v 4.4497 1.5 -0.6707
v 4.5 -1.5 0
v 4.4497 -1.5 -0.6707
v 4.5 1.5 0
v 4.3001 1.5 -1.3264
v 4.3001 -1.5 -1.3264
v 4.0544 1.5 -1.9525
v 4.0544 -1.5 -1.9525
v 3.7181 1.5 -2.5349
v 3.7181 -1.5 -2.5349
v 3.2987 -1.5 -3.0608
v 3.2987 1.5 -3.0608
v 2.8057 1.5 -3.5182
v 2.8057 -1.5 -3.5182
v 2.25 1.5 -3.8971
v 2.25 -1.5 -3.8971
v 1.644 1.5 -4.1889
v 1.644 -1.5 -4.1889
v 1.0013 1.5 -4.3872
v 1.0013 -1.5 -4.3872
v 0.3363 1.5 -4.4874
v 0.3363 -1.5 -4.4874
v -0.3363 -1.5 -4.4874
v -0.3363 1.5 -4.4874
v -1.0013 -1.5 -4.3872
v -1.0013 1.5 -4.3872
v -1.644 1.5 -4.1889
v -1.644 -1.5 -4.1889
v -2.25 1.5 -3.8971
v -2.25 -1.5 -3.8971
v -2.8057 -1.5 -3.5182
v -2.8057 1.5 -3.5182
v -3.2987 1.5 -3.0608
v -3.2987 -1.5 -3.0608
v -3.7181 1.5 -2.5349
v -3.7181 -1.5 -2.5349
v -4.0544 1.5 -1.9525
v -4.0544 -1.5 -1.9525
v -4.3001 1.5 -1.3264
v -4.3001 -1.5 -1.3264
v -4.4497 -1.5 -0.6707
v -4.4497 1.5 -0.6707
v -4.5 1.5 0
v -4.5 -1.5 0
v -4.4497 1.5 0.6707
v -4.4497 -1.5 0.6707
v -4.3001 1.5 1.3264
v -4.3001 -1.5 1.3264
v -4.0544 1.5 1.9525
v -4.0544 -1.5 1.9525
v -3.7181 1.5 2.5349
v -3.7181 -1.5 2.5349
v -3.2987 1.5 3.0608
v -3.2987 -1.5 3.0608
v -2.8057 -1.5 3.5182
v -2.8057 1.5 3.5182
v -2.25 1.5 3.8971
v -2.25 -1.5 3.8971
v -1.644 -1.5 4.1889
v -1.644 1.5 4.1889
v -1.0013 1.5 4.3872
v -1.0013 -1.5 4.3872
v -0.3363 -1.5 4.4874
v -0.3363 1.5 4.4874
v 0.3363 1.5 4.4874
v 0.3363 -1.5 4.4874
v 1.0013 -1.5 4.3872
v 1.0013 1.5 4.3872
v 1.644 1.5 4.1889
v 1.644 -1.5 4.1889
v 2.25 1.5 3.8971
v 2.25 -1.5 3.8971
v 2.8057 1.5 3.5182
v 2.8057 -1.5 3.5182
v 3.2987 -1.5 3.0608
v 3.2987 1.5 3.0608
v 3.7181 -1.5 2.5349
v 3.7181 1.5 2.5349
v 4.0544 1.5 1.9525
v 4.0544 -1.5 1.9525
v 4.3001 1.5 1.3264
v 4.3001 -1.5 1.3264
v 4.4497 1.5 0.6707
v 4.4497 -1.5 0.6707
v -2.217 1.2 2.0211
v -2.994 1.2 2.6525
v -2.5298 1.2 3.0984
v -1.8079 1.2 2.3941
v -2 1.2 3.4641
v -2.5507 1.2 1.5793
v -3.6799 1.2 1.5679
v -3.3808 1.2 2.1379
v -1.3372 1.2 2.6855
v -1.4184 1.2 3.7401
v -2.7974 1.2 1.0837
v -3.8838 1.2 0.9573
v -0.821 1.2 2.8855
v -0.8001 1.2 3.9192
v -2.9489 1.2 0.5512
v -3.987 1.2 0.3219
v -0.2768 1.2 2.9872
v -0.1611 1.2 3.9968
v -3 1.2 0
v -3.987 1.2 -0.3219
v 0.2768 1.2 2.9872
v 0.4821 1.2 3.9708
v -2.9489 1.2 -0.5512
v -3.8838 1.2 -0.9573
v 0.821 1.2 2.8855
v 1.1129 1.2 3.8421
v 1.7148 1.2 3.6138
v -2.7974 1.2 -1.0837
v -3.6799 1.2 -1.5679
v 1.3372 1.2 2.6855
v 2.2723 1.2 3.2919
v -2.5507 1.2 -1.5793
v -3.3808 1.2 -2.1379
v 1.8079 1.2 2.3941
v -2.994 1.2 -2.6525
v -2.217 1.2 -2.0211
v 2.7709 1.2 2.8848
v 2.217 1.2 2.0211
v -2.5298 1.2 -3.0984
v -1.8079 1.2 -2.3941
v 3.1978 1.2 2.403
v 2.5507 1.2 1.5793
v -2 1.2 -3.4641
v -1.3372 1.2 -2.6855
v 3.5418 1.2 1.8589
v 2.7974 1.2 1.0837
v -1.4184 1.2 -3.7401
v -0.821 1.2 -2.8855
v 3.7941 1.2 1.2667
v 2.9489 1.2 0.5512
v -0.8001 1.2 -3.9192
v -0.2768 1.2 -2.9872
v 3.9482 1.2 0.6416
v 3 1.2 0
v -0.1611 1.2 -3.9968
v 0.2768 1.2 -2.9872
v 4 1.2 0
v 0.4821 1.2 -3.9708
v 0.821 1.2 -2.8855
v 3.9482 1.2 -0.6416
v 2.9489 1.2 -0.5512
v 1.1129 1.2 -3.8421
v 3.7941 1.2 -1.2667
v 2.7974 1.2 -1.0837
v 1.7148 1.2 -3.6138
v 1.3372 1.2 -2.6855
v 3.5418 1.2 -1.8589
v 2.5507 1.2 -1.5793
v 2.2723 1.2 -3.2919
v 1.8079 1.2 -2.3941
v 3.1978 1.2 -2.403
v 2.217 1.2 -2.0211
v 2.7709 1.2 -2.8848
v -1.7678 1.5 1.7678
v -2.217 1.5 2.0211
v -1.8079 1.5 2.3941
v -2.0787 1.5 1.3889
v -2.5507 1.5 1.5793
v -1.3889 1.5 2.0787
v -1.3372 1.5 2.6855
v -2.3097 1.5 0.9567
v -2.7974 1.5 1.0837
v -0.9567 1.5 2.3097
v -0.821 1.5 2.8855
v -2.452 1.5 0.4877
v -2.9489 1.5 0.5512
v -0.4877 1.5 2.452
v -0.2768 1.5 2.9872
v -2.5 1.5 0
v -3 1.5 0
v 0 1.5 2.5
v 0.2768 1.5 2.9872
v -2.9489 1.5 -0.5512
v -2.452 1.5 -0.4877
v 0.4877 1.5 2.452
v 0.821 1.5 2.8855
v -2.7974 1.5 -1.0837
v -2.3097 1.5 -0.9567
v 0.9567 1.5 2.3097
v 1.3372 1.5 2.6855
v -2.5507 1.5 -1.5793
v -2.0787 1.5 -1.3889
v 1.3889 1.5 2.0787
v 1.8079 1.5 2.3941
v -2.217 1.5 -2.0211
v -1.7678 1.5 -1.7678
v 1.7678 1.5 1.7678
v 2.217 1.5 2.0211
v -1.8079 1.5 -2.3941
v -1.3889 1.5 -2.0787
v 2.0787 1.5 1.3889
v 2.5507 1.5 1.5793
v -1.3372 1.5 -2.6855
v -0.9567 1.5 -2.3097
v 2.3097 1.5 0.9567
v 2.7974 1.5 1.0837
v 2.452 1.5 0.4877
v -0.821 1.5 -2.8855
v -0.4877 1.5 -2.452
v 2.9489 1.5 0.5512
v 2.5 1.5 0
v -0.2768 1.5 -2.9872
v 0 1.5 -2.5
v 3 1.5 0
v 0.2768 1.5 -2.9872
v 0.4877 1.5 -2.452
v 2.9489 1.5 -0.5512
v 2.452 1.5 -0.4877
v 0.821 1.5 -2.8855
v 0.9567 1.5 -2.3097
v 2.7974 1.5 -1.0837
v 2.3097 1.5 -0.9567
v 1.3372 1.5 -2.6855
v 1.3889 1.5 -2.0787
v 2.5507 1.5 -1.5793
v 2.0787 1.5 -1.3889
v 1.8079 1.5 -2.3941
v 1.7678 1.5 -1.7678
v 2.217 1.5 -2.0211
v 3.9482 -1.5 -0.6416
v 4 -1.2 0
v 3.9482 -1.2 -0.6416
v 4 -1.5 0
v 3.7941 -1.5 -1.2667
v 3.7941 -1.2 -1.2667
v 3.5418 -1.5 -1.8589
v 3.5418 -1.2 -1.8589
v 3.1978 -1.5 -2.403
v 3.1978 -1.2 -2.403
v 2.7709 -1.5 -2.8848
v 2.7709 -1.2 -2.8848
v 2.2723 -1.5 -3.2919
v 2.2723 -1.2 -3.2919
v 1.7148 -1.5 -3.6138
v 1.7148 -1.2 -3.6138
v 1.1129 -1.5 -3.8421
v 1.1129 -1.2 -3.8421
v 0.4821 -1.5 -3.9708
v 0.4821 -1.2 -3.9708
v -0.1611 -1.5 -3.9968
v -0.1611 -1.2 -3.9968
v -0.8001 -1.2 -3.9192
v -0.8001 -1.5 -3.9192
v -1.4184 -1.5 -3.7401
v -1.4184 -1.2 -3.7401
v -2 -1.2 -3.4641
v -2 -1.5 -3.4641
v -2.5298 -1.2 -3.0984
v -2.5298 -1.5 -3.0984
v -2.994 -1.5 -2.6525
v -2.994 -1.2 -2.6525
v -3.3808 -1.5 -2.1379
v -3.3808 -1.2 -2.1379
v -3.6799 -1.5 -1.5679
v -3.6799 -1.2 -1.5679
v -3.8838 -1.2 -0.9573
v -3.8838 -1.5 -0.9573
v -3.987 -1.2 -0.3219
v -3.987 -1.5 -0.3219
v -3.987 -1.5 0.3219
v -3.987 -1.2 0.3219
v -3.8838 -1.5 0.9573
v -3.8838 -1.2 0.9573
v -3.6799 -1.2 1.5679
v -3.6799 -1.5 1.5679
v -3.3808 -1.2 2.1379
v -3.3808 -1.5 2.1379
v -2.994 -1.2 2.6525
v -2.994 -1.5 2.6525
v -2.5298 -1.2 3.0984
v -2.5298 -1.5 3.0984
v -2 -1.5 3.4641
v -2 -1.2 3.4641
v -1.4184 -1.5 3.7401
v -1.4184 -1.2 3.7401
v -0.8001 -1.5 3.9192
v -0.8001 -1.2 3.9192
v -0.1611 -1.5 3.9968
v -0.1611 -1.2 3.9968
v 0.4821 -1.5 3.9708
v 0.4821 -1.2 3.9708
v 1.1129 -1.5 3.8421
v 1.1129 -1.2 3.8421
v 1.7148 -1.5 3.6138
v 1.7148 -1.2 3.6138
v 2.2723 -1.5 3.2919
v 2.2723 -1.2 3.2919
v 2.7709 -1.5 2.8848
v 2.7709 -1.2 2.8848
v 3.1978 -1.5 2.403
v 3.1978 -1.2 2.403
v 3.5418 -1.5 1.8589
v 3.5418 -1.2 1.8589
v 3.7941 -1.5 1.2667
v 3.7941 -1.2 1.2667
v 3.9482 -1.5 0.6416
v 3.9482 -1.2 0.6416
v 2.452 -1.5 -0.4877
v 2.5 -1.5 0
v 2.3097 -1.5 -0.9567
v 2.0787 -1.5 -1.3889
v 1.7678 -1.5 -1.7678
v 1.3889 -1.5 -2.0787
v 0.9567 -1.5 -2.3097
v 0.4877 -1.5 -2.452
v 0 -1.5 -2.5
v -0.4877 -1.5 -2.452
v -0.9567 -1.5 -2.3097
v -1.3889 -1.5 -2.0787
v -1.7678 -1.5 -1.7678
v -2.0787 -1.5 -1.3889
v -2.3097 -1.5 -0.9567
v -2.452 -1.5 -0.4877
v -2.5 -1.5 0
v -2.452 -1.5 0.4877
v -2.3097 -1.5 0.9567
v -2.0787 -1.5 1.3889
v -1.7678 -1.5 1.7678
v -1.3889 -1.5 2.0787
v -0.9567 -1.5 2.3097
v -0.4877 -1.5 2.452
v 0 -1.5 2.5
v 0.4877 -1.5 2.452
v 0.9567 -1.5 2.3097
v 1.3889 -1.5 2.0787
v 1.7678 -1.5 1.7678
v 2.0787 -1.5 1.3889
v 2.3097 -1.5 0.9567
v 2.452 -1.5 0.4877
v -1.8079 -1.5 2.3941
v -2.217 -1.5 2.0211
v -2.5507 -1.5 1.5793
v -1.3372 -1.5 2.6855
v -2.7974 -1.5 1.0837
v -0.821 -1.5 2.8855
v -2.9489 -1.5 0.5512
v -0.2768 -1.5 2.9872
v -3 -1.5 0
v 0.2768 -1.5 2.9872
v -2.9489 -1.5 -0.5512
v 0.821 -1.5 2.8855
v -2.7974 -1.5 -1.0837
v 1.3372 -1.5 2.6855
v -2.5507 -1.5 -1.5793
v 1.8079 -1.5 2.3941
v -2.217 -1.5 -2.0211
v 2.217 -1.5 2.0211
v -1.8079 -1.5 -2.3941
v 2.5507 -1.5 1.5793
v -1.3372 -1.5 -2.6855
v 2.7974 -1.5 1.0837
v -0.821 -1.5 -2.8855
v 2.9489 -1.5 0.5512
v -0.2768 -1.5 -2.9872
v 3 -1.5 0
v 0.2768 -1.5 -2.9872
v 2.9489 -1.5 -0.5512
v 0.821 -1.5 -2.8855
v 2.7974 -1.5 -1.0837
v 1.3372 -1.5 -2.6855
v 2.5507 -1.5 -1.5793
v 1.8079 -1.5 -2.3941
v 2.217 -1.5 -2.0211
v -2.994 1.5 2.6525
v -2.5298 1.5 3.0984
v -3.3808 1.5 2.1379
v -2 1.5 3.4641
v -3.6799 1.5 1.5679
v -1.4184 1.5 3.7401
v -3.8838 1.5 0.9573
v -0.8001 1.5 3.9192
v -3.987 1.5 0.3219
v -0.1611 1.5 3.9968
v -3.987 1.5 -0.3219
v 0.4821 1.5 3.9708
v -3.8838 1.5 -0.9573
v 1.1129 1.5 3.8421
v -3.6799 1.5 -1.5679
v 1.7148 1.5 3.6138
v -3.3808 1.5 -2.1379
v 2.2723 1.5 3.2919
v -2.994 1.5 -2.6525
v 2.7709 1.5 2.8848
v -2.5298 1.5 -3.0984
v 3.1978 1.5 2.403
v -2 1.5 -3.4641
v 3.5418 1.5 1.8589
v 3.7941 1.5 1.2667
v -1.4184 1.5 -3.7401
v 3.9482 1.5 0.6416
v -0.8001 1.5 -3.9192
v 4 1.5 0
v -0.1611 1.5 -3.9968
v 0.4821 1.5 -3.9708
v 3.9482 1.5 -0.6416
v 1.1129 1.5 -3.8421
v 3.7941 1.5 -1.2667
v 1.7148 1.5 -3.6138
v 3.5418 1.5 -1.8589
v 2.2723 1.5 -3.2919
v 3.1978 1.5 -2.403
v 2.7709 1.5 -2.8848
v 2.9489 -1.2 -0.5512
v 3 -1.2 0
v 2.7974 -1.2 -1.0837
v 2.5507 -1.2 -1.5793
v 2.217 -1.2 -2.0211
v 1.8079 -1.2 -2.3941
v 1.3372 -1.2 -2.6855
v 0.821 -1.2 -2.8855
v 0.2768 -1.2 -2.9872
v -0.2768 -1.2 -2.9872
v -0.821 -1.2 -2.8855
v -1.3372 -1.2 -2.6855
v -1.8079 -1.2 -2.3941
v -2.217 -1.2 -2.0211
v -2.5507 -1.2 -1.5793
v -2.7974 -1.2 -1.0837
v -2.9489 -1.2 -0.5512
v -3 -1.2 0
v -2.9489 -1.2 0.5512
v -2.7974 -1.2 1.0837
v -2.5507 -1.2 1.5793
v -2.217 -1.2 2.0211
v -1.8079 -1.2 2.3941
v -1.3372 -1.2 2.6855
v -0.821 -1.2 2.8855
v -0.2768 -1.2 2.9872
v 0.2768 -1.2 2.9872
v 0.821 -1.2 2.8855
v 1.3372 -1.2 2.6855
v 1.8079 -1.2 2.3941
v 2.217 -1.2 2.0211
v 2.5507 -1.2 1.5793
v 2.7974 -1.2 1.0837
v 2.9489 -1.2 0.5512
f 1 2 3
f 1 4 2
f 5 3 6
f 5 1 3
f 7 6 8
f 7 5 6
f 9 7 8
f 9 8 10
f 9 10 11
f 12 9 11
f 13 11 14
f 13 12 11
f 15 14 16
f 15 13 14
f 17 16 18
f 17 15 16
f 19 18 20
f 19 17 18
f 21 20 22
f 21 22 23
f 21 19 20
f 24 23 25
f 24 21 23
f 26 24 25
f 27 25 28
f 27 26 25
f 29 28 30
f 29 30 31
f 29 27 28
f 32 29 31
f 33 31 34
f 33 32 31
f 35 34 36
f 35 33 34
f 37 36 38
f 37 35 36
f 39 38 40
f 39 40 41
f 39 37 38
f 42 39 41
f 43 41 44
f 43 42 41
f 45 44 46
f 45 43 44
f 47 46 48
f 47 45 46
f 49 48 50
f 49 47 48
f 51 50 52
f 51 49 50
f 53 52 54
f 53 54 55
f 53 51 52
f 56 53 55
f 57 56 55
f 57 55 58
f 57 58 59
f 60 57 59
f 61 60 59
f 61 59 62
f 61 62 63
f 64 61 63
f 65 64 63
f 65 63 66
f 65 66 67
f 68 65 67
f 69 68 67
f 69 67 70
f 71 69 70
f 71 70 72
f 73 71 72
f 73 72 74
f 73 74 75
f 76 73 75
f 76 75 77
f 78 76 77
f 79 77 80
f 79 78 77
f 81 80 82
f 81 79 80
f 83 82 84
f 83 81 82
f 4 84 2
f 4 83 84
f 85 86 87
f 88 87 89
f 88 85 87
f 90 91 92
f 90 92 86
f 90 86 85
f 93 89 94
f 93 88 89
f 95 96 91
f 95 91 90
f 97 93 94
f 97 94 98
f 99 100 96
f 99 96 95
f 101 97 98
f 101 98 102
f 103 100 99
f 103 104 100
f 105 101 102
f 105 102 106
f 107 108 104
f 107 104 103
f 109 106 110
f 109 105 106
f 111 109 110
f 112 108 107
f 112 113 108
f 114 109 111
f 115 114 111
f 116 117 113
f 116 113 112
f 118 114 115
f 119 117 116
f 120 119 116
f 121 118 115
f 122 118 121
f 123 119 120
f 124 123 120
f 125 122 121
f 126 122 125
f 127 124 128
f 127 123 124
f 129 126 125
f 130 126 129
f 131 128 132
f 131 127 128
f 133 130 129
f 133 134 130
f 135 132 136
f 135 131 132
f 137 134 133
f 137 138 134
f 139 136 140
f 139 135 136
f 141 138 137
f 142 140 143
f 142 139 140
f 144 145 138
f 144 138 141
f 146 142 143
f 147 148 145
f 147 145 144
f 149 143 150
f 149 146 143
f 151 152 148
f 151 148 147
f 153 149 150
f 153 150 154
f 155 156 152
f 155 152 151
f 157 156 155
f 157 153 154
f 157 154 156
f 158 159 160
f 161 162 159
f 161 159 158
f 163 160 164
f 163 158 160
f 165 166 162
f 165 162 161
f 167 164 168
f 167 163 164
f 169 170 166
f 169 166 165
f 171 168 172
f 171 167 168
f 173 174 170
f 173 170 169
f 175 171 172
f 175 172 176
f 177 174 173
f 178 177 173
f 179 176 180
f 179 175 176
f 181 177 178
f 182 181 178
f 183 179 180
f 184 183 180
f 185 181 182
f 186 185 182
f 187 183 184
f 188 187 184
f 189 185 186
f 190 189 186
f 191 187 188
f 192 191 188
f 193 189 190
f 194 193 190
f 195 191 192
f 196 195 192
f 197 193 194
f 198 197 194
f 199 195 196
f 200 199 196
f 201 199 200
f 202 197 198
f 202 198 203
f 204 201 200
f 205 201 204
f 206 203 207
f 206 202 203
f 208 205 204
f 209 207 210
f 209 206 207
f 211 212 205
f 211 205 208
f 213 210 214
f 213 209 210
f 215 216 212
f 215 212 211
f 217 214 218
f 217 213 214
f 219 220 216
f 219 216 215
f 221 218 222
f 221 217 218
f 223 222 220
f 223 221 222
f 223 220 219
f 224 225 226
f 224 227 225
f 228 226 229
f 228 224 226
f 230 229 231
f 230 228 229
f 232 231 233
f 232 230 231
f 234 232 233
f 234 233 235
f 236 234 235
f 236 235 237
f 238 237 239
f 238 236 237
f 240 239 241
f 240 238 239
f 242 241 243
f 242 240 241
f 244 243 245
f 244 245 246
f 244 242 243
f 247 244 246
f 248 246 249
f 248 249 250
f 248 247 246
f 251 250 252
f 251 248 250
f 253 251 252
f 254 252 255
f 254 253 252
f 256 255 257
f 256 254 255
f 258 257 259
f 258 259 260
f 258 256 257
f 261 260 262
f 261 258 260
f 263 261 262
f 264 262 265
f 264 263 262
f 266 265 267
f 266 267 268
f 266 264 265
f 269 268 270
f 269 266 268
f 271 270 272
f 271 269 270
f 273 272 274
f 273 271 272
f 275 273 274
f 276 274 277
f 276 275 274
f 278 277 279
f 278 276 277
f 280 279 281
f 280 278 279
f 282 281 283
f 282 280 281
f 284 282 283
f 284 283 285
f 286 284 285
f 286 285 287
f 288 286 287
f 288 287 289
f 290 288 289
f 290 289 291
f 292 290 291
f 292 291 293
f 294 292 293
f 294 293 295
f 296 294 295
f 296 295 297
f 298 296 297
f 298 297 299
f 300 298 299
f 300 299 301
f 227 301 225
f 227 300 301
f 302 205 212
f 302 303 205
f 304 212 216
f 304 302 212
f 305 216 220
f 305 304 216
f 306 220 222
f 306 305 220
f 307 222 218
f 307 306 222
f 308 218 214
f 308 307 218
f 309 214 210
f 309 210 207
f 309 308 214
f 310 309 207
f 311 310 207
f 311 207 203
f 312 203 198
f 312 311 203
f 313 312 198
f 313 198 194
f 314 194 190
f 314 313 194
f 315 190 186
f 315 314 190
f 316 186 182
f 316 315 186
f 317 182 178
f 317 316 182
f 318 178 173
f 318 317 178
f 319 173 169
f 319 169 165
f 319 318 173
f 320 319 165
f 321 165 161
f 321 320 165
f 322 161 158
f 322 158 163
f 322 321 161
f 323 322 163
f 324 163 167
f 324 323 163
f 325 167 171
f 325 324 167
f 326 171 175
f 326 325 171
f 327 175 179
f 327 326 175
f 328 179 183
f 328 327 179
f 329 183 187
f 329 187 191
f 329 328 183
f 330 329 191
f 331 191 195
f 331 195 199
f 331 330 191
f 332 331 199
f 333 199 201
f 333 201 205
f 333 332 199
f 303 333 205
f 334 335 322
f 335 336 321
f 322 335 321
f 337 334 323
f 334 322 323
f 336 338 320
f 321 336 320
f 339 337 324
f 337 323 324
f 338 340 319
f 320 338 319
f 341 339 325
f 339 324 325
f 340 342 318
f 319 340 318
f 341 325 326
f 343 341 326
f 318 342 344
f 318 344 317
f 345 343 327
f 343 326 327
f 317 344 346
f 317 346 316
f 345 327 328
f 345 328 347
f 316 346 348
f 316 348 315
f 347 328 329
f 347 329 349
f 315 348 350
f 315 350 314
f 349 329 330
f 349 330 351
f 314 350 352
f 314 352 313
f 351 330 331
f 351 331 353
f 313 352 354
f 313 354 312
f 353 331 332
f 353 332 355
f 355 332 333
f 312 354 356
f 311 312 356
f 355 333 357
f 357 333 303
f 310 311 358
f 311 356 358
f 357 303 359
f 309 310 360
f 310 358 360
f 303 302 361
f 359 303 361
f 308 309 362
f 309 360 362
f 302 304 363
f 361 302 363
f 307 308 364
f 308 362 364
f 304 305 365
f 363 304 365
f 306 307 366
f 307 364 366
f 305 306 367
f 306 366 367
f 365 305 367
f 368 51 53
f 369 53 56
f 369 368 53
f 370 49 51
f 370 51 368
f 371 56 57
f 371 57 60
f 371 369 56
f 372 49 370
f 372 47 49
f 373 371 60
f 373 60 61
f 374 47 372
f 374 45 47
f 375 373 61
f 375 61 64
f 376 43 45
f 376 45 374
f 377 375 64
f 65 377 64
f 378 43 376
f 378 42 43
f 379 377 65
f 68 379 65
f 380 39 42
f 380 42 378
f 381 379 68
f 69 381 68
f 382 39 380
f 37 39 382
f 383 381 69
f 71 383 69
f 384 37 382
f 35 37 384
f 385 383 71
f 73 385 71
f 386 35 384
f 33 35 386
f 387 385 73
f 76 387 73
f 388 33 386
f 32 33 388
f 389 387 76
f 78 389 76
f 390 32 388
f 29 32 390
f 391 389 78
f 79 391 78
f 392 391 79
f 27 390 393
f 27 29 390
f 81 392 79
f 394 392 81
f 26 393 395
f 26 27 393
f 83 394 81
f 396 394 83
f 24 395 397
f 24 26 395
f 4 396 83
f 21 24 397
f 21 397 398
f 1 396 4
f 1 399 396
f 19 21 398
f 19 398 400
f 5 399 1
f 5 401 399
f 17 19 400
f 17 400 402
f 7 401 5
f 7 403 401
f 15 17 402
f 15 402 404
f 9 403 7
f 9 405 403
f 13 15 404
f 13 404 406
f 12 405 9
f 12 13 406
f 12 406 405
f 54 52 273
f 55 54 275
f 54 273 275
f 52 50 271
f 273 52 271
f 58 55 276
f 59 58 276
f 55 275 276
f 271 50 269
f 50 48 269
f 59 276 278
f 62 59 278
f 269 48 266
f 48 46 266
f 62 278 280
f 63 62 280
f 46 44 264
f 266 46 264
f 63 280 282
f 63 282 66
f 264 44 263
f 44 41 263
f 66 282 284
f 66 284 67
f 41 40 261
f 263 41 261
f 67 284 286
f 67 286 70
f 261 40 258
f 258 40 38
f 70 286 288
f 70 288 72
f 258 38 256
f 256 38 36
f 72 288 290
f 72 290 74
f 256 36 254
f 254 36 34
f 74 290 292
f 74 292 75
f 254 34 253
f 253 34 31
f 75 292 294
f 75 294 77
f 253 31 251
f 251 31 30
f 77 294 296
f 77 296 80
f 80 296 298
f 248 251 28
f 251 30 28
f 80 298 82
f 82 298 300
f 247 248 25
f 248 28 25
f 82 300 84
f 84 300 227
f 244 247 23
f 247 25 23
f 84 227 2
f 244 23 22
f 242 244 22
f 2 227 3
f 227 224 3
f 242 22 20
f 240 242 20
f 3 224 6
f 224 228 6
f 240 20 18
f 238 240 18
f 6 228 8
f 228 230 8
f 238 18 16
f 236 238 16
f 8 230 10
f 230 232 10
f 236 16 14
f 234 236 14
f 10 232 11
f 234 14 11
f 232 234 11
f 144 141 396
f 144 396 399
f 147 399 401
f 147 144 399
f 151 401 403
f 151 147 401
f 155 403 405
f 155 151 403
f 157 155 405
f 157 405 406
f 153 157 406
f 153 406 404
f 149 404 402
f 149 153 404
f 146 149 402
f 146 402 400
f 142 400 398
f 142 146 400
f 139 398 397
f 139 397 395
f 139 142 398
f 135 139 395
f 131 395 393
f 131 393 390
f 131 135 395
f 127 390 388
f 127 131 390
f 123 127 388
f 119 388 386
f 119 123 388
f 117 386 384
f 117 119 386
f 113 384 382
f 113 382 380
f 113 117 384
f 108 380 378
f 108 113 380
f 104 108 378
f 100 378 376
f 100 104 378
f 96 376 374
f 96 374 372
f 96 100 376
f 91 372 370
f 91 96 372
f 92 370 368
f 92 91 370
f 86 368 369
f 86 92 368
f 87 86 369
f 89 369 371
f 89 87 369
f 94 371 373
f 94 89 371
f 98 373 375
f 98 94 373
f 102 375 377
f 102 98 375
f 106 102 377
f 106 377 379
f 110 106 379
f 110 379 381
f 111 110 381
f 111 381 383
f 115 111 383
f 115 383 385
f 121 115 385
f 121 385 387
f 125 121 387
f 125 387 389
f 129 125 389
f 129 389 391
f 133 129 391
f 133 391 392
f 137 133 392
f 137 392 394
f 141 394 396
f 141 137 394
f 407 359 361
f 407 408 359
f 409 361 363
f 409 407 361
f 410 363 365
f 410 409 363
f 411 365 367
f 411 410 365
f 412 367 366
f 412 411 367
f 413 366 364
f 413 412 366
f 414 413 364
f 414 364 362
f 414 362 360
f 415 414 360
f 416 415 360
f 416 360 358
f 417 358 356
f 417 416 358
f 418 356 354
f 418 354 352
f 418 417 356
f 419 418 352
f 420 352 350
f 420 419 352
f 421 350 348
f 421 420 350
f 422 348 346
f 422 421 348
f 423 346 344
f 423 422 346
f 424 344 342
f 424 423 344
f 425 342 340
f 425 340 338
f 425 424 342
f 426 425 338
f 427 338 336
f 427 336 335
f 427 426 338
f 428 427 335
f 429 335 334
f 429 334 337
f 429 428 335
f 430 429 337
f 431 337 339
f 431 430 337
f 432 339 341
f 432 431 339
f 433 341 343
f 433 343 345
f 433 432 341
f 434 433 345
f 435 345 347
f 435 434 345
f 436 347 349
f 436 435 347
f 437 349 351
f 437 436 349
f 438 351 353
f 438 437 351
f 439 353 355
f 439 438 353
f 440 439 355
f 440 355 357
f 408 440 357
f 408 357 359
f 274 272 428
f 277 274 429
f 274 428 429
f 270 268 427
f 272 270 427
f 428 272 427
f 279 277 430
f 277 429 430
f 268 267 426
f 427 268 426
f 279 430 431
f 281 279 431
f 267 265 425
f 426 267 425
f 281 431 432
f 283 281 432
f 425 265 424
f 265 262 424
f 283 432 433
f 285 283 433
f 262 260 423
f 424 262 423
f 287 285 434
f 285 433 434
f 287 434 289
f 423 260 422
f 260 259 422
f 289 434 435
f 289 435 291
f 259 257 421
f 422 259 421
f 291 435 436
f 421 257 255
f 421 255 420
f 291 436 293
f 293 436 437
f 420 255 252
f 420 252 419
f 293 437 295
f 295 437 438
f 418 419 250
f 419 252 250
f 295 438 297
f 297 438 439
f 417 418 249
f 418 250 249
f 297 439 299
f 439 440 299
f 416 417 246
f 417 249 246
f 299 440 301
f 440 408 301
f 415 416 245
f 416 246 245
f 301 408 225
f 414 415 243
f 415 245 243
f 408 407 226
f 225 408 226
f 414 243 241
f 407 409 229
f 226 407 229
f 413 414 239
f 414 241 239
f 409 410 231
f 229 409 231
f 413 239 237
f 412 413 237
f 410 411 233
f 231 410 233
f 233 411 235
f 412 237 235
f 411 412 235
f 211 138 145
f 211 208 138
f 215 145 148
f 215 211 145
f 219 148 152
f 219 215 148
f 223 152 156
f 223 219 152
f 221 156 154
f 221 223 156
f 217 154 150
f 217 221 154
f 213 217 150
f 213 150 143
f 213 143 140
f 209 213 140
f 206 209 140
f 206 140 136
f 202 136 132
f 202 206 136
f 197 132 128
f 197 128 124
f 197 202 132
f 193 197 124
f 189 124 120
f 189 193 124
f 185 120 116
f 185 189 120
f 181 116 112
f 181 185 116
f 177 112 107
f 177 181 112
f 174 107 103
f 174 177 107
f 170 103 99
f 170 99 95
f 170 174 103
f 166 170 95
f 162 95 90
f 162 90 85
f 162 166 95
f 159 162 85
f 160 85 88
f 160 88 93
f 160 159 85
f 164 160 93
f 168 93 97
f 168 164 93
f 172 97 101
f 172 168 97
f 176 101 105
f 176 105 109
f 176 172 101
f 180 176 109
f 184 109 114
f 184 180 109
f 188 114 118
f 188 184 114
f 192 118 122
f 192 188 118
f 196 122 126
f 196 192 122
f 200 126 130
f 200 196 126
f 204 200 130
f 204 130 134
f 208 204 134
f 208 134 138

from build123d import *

# Parameters (mm, degrees)
EXTRUDE_1_DEPTH        = 1.5
EXTRUDE_1_DEPTH_BACK   = 1.5
SKETCH_1_R             = 3
SKETCH_1_R_2           = 2.5
EXTRUDE_1_2_DEPTH      = 1.5
EXTRUDE_1_2_DEPTH_BACK = 1.5
SKETCH_1_R_3           = 4.5
SKETCH_1_R_4           = 4
EXTRUDE_2_DEPTH        = 1.2
EXTRUDE_2_DEPTH_BACK   = 1.2
SKETCH_2_R             = 4
SKETCH_2_R_2           = 3


with BuildPart() as part:
    # 草图1 → 凸台-拉伸1 (new, two sides: drawn at the far end of the back side and taken through both)
    with BuildSketch(Plane(origin=(0, 0, 0), x_dir=(1, 0, 0), z_dir=(0, 1, 0)).offset(-EXTRUDE_1_DEPTH_BACK)):
        Circle(SKETCH_1_R)
        Circle(SKETCH_1_R_2, mode=Mode.SUBTRACT)
    extrude(amount=EXTRUDE_1_DEPTH + EXTRUDE_1_DEPTH_BACK)



with BuildPart() as body_2:
    # 草图1 → Extrude 1 2 (new, two sides: drawn at the far end of the back side and taken through both)
    with BuildSketch(Plane(origin=(0, 0, 0), x_dir=(1, 0, 0), z_dir=(0, 1, 0)).offset(-EXTRUDE_1_2_DEPTH_BACK)):
        Circle(SKETCH_1_R_3)
        Circle(SKETCH_1_R_4, mode=Mode.SUBTRACT)
    extrude(amount=EXTRUDE_1_2_DEPTH + EXTRUDE_1_2_DEPTH_BACK)


with BuildPart() as part_1:
    add(part.part)

    add(body_2.part)  # 凸台-拉伸2 merges body 2
    # 草图2 → 凸台-拉伸2 (add, two sides: drawn at the far end of the back side and taken through both)
    with BuildSketch(Plane(origin=(0, 0, 0), x_dir=(1, 0, 0), z_dir=(0, 1, 0)).offset(-EXTRUDE_2_DEPTH_BACK)):
        Circle(SKETCH_2_R)
        Circle(SKETCH_2_R_2, mode=Mode.SUBTRACT)
    extrude(amount=EXTRUDE_2_DEPTH + EXTRUDE_2_DEPTH_BACK)


solid = part_1.part
